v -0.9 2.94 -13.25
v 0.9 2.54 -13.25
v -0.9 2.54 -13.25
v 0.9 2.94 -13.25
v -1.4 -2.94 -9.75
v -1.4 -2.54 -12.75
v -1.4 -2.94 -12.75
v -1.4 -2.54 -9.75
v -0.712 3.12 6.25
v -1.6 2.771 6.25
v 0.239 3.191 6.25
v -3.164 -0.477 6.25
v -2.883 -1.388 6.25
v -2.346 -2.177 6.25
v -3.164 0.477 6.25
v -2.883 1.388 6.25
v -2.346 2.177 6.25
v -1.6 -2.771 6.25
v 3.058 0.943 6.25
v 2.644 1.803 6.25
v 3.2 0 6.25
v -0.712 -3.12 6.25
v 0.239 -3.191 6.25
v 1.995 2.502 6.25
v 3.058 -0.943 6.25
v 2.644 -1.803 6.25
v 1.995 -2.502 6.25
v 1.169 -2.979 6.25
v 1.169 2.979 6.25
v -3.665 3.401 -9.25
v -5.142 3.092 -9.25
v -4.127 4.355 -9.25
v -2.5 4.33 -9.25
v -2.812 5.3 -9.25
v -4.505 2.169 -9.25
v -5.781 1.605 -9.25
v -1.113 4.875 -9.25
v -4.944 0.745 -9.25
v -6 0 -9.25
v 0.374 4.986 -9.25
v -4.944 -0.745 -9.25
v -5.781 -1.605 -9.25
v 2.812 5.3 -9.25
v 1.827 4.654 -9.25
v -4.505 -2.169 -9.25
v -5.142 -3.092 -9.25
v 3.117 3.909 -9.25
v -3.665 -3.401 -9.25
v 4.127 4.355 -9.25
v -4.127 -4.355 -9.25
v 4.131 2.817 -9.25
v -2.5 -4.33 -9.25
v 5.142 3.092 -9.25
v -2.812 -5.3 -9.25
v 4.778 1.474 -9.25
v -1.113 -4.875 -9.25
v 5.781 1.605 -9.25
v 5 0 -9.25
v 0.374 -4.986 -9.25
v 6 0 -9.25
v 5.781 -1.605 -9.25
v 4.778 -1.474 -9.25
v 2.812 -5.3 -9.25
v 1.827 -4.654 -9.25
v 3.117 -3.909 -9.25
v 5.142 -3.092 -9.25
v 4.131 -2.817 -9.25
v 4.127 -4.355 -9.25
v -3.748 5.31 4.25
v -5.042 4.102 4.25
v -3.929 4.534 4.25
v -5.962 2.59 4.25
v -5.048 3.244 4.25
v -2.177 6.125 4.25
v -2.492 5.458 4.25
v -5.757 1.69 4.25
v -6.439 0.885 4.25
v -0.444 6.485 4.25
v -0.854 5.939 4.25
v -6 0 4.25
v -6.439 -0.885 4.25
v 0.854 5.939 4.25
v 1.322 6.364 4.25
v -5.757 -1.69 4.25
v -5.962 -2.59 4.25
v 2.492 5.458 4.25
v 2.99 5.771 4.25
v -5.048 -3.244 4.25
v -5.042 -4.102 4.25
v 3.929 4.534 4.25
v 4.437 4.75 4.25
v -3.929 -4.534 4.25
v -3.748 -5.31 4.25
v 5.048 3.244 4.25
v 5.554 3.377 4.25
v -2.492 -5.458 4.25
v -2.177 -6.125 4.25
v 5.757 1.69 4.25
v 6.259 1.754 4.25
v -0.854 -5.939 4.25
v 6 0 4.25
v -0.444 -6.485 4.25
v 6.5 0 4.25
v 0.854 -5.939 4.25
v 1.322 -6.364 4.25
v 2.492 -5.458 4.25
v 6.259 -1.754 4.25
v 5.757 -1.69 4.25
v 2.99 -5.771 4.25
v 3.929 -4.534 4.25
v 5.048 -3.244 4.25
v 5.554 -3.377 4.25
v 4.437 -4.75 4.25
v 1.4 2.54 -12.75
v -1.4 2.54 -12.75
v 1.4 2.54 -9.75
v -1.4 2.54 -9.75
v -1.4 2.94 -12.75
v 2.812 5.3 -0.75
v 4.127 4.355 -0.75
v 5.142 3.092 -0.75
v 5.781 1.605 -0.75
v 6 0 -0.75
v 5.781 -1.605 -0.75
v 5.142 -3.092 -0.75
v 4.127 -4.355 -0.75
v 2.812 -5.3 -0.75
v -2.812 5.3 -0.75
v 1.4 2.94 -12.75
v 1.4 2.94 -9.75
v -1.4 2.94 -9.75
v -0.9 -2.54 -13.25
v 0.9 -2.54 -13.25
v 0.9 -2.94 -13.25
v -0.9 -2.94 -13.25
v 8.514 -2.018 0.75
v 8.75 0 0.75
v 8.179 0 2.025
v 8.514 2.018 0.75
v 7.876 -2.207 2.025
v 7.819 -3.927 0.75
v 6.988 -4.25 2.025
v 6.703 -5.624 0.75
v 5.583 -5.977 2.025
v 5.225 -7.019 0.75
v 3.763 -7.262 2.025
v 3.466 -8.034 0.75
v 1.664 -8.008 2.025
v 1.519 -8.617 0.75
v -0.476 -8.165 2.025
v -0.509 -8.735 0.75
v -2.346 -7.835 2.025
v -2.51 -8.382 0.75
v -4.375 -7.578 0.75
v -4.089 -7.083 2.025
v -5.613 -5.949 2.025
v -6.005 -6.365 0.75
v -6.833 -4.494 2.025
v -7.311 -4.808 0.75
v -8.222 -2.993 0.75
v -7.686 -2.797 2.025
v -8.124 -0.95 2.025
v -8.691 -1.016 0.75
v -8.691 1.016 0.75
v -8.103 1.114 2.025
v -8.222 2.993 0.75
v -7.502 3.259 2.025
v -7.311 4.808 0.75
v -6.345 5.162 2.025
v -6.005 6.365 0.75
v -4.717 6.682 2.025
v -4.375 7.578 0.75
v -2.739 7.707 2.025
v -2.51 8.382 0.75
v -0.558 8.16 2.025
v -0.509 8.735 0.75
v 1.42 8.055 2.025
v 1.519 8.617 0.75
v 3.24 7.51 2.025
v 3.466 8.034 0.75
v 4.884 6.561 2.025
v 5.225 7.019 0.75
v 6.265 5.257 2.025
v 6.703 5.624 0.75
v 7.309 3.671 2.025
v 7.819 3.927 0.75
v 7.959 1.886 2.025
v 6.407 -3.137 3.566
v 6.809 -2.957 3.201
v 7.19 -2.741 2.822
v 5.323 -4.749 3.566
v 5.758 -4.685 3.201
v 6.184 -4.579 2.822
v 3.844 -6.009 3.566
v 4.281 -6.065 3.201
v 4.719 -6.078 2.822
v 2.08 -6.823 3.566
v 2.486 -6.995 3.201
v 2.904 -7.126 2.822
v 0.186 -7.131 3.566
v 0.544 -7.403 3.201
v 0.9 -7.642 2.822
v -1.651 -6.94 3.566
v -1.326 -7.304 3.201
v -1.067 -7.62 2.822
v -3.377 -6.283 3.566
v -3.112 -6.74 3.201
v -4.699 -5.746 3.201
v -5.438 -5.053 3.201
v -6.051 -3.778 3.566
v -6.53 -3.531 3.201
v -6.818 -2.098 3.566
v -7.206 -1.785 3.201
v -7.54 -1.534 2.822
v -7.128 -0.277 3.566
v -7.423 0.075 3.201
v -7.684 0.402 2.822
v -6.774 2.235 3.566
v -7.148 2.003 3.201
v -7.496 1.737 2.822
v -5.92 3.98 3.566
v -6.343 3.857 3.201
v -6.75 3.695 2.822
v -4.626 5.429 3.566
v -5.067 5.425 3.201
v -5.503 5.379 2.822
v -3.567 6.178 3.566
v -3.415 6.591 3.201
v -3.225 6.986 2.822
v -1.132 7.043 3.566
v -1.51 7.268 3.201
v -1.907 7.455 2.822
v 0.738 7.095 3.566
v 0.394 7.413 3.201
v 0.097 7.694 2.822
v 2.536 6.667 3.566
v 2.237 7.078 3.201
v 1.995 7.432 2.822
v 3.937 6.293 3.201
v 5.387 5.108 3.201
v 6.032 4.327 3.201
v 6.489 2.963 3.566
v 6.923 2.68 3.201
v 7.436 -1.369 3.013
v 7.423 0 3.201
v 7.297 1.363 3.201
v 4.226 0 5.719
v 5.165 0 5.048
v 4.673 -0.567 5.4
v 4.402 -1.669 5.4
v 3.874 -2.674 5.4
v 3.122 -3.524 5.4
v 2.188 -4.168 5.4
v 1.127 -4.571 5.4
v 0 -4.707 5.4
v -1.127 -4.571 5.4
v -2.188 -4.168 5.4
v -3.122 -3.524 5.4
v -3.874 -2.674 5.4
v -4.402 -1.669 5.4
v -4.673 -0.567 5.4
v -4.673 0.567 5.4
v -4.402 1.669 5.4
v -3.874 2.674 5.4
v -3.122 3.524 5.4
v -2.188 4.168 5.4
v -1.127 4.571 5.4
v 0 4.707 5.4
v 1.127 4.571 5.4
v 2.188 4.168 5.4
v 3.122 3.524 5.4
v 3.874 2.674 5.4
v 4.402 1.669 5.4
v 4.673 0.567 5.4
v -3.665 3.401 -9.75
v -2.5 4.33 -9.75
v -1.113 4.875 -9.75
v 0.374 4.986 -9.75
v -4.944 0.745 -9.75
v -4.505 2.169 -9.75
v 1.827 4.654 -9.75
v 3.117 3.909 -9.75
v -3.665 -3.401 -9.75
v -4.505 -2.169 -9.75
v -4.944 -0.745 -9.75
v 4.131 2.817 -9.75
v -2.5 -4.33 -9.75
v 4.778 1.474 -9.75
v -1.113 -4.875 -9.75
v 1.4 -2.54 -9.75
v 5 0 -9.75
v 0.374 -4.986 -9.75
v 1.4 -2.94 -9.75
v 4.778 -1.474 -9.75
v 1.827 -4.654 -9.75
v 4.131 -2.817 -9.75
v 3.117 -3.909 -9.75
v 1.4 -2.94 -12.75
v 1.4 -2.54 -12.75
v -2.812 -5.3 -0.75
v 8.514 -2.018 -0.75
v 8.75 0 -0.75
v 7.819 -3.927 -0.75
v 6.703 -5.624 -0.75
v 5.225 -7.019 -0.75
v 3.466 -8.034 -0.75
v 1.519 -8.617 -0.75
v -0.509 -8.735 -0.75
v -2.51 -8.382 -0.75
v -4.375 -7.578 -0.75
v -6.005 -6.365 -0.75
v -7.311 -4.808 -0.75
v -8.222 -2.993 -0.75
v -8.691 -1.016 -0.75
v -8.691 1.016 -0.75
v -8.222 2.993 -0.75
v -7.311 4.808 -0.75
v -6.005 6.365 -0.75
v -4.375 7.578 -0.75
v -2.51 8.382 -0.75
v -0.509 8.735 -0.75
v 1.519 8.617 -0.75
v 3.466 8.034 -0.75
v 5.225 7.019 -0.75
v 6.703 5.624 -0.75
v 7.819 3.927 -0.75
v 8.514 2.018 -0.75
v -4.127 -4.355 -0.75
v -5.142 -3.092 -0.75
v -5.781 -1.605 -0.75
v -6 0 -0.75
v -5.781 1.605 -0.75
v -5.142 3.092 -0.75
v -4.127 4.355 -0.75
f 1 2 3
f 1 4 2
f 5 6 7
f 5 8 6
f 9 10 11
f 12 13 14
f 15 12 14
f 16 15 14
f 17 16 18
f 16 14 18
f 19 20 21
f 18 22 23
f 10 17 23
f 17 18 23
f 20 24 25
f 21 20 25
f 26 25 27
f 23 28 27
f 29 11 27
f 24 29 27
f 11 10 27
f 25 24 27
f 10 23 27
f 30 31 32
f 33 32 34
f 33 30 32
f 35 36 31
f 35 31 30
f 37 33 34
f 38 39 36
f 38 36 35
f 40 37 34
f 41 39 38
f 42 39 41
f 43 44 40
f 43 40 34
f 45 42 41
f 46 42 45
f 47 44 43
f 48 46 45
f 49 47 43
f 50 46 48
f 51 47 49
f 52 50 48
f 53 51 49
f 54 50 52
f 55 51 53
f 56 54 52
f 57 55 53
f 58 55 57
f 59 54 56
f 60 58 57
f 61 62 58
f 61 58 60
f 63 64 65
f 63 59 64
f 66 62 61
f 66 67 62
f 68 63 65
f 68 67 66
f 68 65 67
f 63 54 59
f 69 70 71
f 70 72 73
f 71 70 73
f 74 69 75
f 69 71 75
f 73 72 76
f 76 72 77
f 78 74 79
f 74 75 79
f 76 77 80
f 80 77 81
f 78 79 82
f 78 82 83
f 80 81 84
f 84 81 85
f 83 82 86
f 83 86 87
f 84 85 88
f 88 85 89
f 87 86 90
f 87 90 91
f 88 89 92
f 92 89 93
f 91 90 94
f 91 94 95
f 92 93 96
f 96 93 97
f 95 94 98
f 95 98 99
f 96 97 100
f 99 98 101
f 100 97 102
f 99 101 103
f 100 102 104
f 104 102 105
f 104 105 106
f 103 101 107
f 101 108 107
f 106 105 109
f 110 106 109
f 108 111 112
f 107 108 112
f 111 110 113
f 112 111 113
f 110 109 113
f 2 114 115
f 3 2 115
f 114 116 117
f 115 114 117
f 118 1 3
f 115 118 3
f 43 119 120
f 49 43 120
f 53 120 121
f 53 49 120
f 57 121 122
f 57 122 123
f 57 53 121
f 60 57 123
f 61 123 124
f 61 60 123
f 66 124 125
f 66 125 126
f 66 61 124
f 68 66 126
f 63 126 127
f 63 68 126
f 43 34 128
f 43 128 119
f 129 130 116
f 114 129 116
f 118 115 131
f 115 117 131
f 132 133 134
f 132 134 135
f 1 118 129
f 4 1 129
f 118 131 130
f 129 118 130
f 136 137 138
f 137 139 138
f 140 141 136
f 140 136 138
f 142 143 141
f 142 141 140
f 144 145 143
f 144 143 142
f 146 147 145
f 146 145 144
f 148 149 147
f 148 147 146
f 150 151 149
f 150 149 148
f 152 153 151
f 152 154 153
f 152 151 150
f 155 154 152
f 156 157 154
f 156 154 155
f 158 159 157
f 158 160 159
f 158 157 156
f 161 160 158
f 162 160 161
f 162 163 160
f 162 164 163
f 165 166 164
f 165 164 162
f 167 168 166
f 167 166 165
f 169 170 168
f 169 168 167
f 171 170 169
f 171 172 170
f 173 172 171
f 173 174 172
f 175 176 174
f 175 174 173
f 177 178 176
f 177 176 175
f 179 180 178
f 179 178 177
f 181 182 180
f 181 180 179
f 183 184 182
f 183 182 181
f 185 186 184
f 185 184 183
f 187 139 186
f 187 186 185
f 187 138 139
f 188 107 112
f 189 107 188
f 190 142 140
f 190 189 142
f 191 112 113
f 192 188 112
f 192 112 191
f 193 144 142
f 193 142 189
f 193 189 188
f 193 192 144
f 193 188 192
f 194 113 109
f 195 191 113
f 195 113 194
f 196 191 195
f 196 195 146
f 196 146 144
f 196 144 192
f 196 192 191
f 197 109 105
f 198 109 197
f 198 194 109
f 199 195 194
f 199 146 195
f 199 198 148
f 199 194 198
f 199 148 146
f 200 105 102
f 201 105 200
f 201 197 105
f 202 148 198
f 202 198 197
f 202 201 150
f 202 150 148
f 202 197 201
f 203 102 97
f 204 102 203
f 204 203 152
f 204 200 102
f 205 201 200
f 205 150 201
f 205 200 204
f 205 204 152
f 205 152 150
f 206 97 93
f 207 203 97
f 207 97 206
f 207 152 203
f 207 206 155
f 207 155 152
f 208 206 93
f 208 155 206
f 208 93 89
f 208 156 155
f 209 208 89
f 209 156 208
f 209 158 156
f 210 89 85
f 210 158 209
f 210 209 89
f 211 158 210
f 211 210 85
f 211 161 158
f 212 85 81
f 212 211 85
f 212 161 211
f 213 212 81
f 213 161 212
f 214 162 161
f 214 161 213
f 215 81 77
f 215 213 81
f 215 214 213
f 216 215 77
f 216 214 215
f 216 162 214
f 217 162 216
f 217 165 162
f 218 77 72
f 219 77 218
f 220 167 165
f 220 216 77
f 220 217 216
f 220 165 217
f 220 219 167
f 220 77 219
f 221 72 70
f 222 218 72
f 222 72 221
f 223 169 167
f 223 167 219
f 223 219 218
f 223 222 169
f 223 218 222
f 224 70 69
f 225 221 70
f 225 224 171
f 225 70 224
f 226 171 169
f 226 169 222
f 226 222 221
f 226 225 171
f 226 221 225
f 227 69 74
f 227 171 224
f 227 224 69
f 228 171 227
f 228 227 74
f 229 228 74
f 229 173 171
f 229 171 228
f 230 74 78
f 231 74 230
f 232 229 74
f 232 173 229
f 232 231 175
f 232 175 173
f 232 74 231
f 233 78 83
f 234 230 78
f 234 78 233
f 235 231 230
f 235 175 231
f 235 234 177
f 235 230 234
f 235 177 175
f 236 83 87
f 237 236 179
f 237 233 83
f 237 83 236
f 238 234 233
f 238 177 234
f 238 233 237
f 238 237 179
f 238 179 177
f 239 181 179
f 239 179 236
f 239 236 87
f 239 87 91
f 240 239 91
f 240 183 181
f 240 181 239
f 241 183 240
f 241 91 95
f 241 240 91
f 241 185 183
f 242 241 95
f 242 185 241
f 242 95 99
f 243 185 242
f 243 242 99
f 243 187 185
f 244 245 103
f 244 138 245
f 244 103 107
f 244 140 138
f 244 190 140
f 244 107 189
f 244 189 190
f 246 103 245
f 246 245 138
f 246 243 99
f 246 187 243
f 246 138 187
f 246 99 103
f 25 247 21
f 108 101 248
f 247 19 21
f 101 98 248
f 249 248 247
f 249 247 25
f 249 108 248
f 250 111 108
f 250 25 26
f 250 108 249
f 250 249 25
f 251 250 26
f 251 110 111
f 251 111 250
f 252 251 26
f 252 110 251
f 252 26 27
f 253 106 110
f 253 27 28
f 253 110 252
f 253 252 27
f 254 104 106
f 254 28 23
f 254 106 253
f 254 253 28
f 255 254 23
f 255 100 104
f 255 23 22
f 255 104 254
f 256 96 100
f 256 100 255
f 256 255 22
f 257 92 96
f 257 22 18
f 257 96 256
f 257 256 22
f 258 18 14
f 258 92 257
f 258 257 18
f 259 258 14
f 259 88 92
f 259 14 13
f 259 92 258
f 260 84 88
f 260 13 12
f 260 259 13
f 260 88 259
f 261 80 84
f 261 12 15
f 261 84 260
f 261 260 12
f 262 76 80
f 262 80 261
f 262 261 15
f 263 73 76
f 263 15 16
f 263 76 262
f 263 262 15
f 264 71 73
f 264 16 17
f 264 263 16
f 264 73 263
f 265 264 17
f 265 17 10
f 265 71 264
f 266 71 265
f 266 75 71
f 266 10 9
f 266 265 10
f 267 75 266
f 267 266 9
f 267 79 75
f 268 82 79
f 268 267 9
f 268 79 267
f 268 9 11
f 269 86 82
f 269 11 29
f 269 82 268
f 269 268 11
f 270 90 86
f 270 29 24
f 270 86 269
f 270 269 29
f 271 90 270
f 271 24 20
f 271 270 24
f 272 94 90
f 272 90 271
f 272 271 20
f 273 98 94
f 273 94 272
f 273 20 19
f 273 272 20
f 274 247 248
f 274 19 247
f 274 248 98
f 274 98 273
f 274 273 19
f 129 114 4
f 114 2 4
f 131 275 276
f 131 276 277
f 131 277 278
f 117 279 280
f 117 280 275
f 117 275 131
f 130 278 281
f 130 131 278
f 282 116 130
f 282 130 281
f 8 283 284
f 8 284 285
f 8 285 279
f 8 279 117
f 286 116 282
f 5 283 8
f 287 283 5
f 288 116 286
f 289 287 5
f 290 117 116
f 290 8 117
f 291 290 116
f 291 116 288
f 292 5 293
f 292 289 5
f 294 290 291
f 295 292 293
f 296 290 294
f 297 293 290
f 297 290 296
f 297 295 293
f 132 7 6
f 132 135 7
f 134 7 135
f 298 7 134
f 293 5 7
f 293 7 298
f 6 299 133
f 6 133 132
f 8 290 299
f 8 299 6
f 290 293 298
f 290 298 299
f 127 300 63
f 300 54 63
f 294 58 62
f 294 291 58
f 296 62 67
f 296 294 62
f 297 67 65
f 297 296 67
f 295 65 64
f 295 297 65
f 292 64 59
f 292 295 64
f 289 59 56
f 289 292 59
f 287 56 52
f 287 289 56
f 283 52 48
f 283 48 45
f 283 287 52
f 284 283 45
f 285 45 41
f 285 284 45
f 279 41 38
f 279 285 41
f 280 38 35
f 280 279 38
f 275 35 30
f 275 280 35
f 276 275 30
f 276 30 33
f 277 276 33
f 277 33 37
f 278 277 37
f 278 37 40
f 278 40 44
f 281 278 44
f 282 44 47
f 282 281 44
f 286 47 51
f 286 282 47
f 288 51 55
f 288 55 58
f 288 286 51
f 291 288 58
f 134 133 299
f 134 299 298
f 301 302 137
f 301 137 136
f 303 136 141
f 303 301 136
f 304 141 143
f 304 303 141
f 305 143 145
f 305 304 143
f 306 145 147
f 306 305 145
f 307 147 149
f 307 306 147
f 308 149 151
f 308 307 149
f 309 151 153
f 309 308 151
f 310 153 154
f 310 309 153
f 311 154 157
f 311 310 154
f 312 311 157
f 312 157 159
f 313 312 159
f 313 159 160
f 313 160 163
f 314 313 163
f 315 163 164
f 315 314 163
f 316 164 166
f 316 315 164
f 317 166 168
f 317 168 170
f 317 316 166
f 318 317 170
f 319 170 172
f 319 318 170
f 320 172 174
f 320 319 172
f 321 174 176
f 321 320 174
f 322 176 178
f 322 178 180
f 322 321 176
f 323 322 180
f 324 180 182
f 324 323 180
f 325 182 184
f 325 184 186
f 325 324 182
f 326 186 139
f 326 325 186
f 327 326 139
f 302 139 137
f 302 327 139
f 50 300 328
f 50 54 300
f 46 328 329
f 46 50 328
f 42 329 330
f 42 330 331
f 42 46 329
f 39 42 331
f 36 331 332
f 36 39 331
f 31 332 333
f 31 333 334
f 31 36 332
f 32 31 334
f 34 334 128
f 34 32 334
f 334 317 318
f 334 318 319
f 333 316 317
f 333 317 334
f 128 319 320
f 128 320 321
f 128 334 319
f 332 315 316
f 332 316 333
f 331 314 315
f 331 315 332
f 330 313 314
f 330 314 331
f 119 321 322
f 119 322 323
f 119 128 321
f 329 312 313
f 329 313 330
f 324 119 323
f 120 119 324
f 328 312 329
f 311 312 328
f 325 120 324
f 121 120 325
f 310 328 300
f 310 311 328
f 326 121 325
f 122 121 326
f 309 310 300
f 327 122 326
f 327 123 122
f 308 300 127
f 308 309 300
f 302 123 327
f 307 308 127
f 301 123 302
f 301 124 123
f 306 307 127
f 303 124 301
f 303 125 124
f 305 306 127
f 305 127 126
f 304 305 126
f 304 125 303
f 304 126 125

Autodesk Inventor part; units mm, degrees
ref_plane "YZ Plane" through (0, 0, 0) normal (1, 0, 0) x (0, 1, 0)
ref_plane "XZ Plane" through (0, 0, 0) normal (0, 1, 0) x (-1, 0, 0)
ref_plane "XY Plane" through (0, 0, 0) normal (0, 0, 1) x (1, 0, 0)
sketch "Sketch1" plane through (0, 0, 0) normal (0, 1, 0) x (-1, 0, 0)
  line L0 (-8.75, -0.75) -> (8.75, -0.75)
  line L1 (8.75, -0.75) -> (8.75, 0.75)
  line L2 (8.75, 0.75) -> (-8.75, 0.75)
  line L3 (-8.75, 0.75) -> (-8.75, -0.75)
  line L4 (-8.75, -0.75) -> (8.75, 0.75) construction
  line L5 (8.75, -0.75) -> (-8.75, 0.75) construction
  line L6 (6.5, 4.25) -> (-6.5, 4.25)
  line L7 (0, 21.8262) -> (0, -10.0956)
  arc A0 (-6.5, 4.25) -> (-8.75, 0.75) centre (0, -2.4018) ccw
  arc A1 (8.75, 0.75) -> (6.5, 4.25) centre (0, -2.4018) ccw
  line L8 (3.2, 6.25) -> (-3.2, 6.25)
  line L9 (6, 4.25) -> (-6, 4.25)
  arc A2 (6, 4.25) -> (3.2, 6.25) centre (0, -1.19) ccw
  arc A3 (7.8812, 0.6755) -> (7.8632, 0.75) centre (0, -1.19) ccw
  arc A4 (8.087, -0.75) -> (8.0837, -0.6929) centre (0, -1.19) ccw
  arc A5 (-8.0837, -0.6929) -> (-8.087, -0.75) centre (0, -1.19) ccw
  arc A6 (-3.2, 6.25) -> (-6, 4.25) centre (0, -1.19) ccw
  arc A7 (-7.8632, 0.75) -> (-7.8812, 0.6755) centre (0, -1.19) ccw
  line L10 (-6, -9.25) -> (6, -9.25)
  line L11 (6, -9.25) -> (6, -0.75)
  line L12 (6, -0.75) -> (-6, -0.75)
  line L13 (-6, -0.75) -> (-6, -9.25)
  line L14 (-6, -9.25) -> (6, -0.75) construction
  line L15 (6, -9.25) -> (-6, -0.75) construction
  line L16 (-5, -9.75) -> (5, -9.75)
  line L17 (5, -9.75) -> (5, -9.25)
  line L18 (5, -9.25) -> (-5, -9.25)
  line L19 (-5, -9.25) -> (-5, -9.75)
  line L20 (-5, -9.75) -> (5, -9.25) construction
  line L21 (5, -9.75) -> (-5, -9.25) construction
  point P0 (0, 0)
  point P1 (0, 4.25)
  point P2 (0, 0)
  point P3 (0, 6.25)
  point P4 (0, 4.25)
  point P5 (0, -5)
  point P6 (0, -9.5)
  point P7 (0, -9.75)
  dimension "d0" = 17.5
  dimension "d1" = 1.5
  dimension "d2" = 13
  dimension "d3" = 5
  dimension "d4" = 2
  dimension "d5" = 6.4
  dimension "d6" = 12
  dimension "d7" = 12
  dimension "d8" = 8.5
  dimension "d9" = 10
  dimension "d10" = 0.5
revolve "Revolution1" add sketch "Sketch1" angle 360 about axis through (0, 0, 21.8262) along (0, 0, -1) contours L3 L2 L7 L0 | A0 L6 L7 L2 | L0 L7 L10 L13 | A6 L8 L7 L6 | L7 L16 L19 L10
sketch "Sketch2" plane through (0, 0, -9.75) normal (0, 0, -1) x (-1, 0, 0)
  line L0 (0, -14.0708) -> (0, 14.0708) construction
  line L1 (1.4, -2.94) -> (-1.4, -2.94)
  line L2 (-1.4, -2.94) -> (-1.4, -2.54)
  line L3 (-1.4, -2.54) -> (1.4, -2.54)
  line L4 (1.4, -2.54) -> (1.4, -2.94)
  line L5 (1.4, -2.94) -> (-1.4, -2.54) construction
  line L6 (-1.4, -2.94) -> (1.4, -2.54) construction
  line L7 (1.4, 2.94) -> (-1.4, 2.94)
  line L8 (-1.4, 2.94) -> (-1.4, 2.54)
  line L9 (-1.4, 2.54) -> (1.4, 2.54)
  line L10 (1.4, 2.54) -> (1.4, 2.94)
  line L11 (1.4, 2.94) -> (-1.4, 2.54) construction
  line L12 (-1.4, 2.94) -> (1.4, 2.54) construction
  point P0 (0, 0)
  point P1 (0, 0)
  point P2 (0, -2.74)
  point P3 (0, 2.74)
  dimension "d12" = 2.8
  dimension "d13" = 0.4
  dimension "d14" = 2.8
  dimension "d15" = 0.4
  dimension "d16" = 5.08
  dimension "d17" = 2.54
extrude "Extrusion1" add sketch "Sketch2" along normal blind 3.5
chamfer "Chamfer1" distance 0.5 angle 45 4 edges at (1.4, -2.74, -13.25) (-1.4, -2.74, -13.25) (1.4, 2.74, -13.25) (-1.4, 2.74, -13.25)
thread "Thread1" size "M12x0.75" class "6g" standard "ANSI Metric M Profile" length 12.5
sketch "Sketch3" plane through (0, 0, -9.25) normal (0, 0, -1) x (-1, 0, 0)
  line L0 (12.7626, -5.3) -> (-12.9759, -5.3)
  line L1 (12.7626, 5.3) -> (-13.4328, 5.3)
  line L2 (14.0115, 0) -> (-13.4328, 0) construction
  circle A0 centre (0, 0) radius 6 construction
  circle A1 centre (0, 0) radius 6
  point P0 (0, 0)
  point P1 (-2.8125, 5.3)
  point P2 (2.8125, 5.3)
  point P3 (-2.8125, -5.3)
  point P4 (2.8125, -5.3)
  dimension "d25" = 10.6
extrude "Extrusion2" cut sketch "Sketch3" against normal up to surface (8.5 mm away) contours A1 L0 | A1 L1
properties part number "Sprung Button DigiKey EG9580-ND"
